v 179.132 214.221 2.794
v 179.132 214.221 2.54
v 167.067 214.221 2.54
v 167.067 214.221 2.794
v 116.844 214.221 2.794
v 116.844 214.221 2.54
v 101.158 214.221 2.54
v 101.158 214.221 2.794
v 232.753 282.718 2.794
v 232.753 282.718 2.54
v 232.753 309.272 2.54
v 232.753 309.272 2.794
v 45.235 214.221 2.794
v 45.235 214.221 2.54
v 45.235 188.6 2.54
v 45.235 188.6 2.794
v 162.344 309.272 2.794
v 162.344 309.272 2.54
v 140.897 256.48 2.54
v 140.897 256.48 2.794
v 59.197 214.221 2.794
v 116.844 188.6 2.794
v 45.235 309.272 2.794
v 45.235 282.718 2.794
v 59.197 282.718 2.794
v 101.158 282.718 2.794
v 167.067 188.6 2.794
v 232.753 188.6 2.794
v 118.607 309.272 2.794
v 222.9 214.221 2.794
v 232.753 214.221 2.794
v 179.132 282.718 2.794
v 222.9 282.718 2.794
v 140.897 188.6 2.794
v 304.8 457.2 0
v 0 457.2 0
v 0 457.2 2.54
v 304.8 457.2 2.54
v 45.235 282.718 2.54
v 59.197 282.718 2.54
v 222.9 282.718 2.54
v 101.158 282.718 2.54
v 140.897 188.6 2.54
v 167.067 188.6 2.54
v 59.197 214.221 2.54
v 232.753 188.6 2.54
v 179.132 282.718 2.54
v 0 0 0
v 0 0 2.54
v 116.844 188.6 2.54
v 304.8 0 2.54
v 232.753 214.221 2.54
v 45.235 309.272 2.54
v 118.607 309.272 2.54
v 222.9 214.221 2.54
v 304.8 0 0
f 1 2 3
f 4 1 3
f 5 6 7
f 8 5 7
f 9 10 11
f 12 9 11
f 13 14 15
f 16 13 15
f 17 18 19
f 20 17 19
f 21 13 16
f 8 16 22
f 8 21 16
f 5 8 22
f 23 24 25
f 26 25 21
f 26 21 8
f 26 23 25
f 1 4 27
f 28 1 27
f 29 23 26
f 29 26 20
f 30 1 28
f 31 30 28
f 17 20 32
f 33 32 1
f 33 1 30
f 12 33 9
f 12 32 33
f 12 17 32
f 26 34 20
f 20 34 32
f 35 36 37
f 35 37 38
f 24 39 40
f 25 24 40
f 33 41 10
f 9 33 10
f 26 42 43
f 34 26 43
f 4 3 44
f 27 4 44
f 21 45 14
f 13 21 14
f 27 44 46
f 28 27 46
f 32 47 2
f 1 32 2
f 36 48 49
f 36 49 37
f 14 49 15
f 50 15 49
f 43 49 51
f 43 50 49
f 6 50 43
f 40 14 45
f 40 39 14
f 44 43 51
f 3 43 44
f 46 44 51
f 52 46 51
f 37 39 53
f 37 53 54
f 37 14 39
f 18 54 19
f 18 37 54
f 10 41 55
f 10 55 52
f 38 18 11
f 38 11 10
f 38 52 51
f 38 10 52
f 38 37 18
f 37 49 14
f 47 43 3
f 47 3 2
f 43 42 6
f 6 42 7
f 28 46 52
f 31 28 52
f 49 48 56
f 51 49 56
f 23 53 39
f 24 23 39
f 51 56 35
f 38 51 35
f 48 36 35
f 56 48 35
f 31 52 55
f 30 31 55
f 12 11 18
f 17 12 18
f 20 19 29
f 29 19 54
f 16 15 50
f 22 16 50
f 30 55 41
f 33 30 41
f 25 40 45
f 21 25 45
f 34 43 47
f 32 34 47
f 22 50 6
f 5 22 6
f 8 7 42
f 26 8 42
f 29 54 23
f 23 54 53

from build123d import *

# Parameters (mm, degrees)
SKETCH1_W           = 304.8
SKETCH1_H           = 457.2
BOSS_EXTRUDE1_DEPTH = 2.54
BOSS_EXTRUDE2_DEPTH = 0.254


with BuildPart() as part:
    # Sketch1 → Boss-Extrude1 (new body)
    with BuildSketch(Plane.XY):
        with Locations((152.4, 228.6)):
            Rectangle(SKETCH1_W, SKETCH1_H)
    extrude(amount=BOSS_EXTRUDE1_DEPTH)

    # Sketch2 → Boss-Extrude2 (add)
    with BuildSketch(Plane.XY.offset(2.54)):
        Polygon((76.582640735, 188.599807008), (116.844272896, 188.599807008), (116.844272896, 214.220845657), (101.157922704, 214.220845657), (101.157922704, 282.717908165), (140.896676525, 188.599807008), (179.13215512, 282.717908165), (179.13215512, 214.220845657), (167.067091951, 214.220845657), (167.067091951, 188.599807008), (232.753082879, 188.599807008), (232.753082879, 214.220845657), (222.900184239, 214.220845657), (222.900184239, 282.717908165), (232.753082879, 282.717908165), (232.753082879, 309.27172291), (222.900184239, 309.27172291), (162.34351535, 309.27172291), (140.896676525, 256.479504264), (118.606628652, 309.27172291), (59.196762562, 309.27172291), (45.234909284, 309.27172291), (45.234909284, 282.717908165), (59.196762562, 282.717908165), (59.196762562, 214.220845657), (45.234909284, 214.220845657), (45.234909284, 188.599807008), align=None)
    extrude(amount=BOSS_EXTRUDE2_DEPTH)


solid = part.part
